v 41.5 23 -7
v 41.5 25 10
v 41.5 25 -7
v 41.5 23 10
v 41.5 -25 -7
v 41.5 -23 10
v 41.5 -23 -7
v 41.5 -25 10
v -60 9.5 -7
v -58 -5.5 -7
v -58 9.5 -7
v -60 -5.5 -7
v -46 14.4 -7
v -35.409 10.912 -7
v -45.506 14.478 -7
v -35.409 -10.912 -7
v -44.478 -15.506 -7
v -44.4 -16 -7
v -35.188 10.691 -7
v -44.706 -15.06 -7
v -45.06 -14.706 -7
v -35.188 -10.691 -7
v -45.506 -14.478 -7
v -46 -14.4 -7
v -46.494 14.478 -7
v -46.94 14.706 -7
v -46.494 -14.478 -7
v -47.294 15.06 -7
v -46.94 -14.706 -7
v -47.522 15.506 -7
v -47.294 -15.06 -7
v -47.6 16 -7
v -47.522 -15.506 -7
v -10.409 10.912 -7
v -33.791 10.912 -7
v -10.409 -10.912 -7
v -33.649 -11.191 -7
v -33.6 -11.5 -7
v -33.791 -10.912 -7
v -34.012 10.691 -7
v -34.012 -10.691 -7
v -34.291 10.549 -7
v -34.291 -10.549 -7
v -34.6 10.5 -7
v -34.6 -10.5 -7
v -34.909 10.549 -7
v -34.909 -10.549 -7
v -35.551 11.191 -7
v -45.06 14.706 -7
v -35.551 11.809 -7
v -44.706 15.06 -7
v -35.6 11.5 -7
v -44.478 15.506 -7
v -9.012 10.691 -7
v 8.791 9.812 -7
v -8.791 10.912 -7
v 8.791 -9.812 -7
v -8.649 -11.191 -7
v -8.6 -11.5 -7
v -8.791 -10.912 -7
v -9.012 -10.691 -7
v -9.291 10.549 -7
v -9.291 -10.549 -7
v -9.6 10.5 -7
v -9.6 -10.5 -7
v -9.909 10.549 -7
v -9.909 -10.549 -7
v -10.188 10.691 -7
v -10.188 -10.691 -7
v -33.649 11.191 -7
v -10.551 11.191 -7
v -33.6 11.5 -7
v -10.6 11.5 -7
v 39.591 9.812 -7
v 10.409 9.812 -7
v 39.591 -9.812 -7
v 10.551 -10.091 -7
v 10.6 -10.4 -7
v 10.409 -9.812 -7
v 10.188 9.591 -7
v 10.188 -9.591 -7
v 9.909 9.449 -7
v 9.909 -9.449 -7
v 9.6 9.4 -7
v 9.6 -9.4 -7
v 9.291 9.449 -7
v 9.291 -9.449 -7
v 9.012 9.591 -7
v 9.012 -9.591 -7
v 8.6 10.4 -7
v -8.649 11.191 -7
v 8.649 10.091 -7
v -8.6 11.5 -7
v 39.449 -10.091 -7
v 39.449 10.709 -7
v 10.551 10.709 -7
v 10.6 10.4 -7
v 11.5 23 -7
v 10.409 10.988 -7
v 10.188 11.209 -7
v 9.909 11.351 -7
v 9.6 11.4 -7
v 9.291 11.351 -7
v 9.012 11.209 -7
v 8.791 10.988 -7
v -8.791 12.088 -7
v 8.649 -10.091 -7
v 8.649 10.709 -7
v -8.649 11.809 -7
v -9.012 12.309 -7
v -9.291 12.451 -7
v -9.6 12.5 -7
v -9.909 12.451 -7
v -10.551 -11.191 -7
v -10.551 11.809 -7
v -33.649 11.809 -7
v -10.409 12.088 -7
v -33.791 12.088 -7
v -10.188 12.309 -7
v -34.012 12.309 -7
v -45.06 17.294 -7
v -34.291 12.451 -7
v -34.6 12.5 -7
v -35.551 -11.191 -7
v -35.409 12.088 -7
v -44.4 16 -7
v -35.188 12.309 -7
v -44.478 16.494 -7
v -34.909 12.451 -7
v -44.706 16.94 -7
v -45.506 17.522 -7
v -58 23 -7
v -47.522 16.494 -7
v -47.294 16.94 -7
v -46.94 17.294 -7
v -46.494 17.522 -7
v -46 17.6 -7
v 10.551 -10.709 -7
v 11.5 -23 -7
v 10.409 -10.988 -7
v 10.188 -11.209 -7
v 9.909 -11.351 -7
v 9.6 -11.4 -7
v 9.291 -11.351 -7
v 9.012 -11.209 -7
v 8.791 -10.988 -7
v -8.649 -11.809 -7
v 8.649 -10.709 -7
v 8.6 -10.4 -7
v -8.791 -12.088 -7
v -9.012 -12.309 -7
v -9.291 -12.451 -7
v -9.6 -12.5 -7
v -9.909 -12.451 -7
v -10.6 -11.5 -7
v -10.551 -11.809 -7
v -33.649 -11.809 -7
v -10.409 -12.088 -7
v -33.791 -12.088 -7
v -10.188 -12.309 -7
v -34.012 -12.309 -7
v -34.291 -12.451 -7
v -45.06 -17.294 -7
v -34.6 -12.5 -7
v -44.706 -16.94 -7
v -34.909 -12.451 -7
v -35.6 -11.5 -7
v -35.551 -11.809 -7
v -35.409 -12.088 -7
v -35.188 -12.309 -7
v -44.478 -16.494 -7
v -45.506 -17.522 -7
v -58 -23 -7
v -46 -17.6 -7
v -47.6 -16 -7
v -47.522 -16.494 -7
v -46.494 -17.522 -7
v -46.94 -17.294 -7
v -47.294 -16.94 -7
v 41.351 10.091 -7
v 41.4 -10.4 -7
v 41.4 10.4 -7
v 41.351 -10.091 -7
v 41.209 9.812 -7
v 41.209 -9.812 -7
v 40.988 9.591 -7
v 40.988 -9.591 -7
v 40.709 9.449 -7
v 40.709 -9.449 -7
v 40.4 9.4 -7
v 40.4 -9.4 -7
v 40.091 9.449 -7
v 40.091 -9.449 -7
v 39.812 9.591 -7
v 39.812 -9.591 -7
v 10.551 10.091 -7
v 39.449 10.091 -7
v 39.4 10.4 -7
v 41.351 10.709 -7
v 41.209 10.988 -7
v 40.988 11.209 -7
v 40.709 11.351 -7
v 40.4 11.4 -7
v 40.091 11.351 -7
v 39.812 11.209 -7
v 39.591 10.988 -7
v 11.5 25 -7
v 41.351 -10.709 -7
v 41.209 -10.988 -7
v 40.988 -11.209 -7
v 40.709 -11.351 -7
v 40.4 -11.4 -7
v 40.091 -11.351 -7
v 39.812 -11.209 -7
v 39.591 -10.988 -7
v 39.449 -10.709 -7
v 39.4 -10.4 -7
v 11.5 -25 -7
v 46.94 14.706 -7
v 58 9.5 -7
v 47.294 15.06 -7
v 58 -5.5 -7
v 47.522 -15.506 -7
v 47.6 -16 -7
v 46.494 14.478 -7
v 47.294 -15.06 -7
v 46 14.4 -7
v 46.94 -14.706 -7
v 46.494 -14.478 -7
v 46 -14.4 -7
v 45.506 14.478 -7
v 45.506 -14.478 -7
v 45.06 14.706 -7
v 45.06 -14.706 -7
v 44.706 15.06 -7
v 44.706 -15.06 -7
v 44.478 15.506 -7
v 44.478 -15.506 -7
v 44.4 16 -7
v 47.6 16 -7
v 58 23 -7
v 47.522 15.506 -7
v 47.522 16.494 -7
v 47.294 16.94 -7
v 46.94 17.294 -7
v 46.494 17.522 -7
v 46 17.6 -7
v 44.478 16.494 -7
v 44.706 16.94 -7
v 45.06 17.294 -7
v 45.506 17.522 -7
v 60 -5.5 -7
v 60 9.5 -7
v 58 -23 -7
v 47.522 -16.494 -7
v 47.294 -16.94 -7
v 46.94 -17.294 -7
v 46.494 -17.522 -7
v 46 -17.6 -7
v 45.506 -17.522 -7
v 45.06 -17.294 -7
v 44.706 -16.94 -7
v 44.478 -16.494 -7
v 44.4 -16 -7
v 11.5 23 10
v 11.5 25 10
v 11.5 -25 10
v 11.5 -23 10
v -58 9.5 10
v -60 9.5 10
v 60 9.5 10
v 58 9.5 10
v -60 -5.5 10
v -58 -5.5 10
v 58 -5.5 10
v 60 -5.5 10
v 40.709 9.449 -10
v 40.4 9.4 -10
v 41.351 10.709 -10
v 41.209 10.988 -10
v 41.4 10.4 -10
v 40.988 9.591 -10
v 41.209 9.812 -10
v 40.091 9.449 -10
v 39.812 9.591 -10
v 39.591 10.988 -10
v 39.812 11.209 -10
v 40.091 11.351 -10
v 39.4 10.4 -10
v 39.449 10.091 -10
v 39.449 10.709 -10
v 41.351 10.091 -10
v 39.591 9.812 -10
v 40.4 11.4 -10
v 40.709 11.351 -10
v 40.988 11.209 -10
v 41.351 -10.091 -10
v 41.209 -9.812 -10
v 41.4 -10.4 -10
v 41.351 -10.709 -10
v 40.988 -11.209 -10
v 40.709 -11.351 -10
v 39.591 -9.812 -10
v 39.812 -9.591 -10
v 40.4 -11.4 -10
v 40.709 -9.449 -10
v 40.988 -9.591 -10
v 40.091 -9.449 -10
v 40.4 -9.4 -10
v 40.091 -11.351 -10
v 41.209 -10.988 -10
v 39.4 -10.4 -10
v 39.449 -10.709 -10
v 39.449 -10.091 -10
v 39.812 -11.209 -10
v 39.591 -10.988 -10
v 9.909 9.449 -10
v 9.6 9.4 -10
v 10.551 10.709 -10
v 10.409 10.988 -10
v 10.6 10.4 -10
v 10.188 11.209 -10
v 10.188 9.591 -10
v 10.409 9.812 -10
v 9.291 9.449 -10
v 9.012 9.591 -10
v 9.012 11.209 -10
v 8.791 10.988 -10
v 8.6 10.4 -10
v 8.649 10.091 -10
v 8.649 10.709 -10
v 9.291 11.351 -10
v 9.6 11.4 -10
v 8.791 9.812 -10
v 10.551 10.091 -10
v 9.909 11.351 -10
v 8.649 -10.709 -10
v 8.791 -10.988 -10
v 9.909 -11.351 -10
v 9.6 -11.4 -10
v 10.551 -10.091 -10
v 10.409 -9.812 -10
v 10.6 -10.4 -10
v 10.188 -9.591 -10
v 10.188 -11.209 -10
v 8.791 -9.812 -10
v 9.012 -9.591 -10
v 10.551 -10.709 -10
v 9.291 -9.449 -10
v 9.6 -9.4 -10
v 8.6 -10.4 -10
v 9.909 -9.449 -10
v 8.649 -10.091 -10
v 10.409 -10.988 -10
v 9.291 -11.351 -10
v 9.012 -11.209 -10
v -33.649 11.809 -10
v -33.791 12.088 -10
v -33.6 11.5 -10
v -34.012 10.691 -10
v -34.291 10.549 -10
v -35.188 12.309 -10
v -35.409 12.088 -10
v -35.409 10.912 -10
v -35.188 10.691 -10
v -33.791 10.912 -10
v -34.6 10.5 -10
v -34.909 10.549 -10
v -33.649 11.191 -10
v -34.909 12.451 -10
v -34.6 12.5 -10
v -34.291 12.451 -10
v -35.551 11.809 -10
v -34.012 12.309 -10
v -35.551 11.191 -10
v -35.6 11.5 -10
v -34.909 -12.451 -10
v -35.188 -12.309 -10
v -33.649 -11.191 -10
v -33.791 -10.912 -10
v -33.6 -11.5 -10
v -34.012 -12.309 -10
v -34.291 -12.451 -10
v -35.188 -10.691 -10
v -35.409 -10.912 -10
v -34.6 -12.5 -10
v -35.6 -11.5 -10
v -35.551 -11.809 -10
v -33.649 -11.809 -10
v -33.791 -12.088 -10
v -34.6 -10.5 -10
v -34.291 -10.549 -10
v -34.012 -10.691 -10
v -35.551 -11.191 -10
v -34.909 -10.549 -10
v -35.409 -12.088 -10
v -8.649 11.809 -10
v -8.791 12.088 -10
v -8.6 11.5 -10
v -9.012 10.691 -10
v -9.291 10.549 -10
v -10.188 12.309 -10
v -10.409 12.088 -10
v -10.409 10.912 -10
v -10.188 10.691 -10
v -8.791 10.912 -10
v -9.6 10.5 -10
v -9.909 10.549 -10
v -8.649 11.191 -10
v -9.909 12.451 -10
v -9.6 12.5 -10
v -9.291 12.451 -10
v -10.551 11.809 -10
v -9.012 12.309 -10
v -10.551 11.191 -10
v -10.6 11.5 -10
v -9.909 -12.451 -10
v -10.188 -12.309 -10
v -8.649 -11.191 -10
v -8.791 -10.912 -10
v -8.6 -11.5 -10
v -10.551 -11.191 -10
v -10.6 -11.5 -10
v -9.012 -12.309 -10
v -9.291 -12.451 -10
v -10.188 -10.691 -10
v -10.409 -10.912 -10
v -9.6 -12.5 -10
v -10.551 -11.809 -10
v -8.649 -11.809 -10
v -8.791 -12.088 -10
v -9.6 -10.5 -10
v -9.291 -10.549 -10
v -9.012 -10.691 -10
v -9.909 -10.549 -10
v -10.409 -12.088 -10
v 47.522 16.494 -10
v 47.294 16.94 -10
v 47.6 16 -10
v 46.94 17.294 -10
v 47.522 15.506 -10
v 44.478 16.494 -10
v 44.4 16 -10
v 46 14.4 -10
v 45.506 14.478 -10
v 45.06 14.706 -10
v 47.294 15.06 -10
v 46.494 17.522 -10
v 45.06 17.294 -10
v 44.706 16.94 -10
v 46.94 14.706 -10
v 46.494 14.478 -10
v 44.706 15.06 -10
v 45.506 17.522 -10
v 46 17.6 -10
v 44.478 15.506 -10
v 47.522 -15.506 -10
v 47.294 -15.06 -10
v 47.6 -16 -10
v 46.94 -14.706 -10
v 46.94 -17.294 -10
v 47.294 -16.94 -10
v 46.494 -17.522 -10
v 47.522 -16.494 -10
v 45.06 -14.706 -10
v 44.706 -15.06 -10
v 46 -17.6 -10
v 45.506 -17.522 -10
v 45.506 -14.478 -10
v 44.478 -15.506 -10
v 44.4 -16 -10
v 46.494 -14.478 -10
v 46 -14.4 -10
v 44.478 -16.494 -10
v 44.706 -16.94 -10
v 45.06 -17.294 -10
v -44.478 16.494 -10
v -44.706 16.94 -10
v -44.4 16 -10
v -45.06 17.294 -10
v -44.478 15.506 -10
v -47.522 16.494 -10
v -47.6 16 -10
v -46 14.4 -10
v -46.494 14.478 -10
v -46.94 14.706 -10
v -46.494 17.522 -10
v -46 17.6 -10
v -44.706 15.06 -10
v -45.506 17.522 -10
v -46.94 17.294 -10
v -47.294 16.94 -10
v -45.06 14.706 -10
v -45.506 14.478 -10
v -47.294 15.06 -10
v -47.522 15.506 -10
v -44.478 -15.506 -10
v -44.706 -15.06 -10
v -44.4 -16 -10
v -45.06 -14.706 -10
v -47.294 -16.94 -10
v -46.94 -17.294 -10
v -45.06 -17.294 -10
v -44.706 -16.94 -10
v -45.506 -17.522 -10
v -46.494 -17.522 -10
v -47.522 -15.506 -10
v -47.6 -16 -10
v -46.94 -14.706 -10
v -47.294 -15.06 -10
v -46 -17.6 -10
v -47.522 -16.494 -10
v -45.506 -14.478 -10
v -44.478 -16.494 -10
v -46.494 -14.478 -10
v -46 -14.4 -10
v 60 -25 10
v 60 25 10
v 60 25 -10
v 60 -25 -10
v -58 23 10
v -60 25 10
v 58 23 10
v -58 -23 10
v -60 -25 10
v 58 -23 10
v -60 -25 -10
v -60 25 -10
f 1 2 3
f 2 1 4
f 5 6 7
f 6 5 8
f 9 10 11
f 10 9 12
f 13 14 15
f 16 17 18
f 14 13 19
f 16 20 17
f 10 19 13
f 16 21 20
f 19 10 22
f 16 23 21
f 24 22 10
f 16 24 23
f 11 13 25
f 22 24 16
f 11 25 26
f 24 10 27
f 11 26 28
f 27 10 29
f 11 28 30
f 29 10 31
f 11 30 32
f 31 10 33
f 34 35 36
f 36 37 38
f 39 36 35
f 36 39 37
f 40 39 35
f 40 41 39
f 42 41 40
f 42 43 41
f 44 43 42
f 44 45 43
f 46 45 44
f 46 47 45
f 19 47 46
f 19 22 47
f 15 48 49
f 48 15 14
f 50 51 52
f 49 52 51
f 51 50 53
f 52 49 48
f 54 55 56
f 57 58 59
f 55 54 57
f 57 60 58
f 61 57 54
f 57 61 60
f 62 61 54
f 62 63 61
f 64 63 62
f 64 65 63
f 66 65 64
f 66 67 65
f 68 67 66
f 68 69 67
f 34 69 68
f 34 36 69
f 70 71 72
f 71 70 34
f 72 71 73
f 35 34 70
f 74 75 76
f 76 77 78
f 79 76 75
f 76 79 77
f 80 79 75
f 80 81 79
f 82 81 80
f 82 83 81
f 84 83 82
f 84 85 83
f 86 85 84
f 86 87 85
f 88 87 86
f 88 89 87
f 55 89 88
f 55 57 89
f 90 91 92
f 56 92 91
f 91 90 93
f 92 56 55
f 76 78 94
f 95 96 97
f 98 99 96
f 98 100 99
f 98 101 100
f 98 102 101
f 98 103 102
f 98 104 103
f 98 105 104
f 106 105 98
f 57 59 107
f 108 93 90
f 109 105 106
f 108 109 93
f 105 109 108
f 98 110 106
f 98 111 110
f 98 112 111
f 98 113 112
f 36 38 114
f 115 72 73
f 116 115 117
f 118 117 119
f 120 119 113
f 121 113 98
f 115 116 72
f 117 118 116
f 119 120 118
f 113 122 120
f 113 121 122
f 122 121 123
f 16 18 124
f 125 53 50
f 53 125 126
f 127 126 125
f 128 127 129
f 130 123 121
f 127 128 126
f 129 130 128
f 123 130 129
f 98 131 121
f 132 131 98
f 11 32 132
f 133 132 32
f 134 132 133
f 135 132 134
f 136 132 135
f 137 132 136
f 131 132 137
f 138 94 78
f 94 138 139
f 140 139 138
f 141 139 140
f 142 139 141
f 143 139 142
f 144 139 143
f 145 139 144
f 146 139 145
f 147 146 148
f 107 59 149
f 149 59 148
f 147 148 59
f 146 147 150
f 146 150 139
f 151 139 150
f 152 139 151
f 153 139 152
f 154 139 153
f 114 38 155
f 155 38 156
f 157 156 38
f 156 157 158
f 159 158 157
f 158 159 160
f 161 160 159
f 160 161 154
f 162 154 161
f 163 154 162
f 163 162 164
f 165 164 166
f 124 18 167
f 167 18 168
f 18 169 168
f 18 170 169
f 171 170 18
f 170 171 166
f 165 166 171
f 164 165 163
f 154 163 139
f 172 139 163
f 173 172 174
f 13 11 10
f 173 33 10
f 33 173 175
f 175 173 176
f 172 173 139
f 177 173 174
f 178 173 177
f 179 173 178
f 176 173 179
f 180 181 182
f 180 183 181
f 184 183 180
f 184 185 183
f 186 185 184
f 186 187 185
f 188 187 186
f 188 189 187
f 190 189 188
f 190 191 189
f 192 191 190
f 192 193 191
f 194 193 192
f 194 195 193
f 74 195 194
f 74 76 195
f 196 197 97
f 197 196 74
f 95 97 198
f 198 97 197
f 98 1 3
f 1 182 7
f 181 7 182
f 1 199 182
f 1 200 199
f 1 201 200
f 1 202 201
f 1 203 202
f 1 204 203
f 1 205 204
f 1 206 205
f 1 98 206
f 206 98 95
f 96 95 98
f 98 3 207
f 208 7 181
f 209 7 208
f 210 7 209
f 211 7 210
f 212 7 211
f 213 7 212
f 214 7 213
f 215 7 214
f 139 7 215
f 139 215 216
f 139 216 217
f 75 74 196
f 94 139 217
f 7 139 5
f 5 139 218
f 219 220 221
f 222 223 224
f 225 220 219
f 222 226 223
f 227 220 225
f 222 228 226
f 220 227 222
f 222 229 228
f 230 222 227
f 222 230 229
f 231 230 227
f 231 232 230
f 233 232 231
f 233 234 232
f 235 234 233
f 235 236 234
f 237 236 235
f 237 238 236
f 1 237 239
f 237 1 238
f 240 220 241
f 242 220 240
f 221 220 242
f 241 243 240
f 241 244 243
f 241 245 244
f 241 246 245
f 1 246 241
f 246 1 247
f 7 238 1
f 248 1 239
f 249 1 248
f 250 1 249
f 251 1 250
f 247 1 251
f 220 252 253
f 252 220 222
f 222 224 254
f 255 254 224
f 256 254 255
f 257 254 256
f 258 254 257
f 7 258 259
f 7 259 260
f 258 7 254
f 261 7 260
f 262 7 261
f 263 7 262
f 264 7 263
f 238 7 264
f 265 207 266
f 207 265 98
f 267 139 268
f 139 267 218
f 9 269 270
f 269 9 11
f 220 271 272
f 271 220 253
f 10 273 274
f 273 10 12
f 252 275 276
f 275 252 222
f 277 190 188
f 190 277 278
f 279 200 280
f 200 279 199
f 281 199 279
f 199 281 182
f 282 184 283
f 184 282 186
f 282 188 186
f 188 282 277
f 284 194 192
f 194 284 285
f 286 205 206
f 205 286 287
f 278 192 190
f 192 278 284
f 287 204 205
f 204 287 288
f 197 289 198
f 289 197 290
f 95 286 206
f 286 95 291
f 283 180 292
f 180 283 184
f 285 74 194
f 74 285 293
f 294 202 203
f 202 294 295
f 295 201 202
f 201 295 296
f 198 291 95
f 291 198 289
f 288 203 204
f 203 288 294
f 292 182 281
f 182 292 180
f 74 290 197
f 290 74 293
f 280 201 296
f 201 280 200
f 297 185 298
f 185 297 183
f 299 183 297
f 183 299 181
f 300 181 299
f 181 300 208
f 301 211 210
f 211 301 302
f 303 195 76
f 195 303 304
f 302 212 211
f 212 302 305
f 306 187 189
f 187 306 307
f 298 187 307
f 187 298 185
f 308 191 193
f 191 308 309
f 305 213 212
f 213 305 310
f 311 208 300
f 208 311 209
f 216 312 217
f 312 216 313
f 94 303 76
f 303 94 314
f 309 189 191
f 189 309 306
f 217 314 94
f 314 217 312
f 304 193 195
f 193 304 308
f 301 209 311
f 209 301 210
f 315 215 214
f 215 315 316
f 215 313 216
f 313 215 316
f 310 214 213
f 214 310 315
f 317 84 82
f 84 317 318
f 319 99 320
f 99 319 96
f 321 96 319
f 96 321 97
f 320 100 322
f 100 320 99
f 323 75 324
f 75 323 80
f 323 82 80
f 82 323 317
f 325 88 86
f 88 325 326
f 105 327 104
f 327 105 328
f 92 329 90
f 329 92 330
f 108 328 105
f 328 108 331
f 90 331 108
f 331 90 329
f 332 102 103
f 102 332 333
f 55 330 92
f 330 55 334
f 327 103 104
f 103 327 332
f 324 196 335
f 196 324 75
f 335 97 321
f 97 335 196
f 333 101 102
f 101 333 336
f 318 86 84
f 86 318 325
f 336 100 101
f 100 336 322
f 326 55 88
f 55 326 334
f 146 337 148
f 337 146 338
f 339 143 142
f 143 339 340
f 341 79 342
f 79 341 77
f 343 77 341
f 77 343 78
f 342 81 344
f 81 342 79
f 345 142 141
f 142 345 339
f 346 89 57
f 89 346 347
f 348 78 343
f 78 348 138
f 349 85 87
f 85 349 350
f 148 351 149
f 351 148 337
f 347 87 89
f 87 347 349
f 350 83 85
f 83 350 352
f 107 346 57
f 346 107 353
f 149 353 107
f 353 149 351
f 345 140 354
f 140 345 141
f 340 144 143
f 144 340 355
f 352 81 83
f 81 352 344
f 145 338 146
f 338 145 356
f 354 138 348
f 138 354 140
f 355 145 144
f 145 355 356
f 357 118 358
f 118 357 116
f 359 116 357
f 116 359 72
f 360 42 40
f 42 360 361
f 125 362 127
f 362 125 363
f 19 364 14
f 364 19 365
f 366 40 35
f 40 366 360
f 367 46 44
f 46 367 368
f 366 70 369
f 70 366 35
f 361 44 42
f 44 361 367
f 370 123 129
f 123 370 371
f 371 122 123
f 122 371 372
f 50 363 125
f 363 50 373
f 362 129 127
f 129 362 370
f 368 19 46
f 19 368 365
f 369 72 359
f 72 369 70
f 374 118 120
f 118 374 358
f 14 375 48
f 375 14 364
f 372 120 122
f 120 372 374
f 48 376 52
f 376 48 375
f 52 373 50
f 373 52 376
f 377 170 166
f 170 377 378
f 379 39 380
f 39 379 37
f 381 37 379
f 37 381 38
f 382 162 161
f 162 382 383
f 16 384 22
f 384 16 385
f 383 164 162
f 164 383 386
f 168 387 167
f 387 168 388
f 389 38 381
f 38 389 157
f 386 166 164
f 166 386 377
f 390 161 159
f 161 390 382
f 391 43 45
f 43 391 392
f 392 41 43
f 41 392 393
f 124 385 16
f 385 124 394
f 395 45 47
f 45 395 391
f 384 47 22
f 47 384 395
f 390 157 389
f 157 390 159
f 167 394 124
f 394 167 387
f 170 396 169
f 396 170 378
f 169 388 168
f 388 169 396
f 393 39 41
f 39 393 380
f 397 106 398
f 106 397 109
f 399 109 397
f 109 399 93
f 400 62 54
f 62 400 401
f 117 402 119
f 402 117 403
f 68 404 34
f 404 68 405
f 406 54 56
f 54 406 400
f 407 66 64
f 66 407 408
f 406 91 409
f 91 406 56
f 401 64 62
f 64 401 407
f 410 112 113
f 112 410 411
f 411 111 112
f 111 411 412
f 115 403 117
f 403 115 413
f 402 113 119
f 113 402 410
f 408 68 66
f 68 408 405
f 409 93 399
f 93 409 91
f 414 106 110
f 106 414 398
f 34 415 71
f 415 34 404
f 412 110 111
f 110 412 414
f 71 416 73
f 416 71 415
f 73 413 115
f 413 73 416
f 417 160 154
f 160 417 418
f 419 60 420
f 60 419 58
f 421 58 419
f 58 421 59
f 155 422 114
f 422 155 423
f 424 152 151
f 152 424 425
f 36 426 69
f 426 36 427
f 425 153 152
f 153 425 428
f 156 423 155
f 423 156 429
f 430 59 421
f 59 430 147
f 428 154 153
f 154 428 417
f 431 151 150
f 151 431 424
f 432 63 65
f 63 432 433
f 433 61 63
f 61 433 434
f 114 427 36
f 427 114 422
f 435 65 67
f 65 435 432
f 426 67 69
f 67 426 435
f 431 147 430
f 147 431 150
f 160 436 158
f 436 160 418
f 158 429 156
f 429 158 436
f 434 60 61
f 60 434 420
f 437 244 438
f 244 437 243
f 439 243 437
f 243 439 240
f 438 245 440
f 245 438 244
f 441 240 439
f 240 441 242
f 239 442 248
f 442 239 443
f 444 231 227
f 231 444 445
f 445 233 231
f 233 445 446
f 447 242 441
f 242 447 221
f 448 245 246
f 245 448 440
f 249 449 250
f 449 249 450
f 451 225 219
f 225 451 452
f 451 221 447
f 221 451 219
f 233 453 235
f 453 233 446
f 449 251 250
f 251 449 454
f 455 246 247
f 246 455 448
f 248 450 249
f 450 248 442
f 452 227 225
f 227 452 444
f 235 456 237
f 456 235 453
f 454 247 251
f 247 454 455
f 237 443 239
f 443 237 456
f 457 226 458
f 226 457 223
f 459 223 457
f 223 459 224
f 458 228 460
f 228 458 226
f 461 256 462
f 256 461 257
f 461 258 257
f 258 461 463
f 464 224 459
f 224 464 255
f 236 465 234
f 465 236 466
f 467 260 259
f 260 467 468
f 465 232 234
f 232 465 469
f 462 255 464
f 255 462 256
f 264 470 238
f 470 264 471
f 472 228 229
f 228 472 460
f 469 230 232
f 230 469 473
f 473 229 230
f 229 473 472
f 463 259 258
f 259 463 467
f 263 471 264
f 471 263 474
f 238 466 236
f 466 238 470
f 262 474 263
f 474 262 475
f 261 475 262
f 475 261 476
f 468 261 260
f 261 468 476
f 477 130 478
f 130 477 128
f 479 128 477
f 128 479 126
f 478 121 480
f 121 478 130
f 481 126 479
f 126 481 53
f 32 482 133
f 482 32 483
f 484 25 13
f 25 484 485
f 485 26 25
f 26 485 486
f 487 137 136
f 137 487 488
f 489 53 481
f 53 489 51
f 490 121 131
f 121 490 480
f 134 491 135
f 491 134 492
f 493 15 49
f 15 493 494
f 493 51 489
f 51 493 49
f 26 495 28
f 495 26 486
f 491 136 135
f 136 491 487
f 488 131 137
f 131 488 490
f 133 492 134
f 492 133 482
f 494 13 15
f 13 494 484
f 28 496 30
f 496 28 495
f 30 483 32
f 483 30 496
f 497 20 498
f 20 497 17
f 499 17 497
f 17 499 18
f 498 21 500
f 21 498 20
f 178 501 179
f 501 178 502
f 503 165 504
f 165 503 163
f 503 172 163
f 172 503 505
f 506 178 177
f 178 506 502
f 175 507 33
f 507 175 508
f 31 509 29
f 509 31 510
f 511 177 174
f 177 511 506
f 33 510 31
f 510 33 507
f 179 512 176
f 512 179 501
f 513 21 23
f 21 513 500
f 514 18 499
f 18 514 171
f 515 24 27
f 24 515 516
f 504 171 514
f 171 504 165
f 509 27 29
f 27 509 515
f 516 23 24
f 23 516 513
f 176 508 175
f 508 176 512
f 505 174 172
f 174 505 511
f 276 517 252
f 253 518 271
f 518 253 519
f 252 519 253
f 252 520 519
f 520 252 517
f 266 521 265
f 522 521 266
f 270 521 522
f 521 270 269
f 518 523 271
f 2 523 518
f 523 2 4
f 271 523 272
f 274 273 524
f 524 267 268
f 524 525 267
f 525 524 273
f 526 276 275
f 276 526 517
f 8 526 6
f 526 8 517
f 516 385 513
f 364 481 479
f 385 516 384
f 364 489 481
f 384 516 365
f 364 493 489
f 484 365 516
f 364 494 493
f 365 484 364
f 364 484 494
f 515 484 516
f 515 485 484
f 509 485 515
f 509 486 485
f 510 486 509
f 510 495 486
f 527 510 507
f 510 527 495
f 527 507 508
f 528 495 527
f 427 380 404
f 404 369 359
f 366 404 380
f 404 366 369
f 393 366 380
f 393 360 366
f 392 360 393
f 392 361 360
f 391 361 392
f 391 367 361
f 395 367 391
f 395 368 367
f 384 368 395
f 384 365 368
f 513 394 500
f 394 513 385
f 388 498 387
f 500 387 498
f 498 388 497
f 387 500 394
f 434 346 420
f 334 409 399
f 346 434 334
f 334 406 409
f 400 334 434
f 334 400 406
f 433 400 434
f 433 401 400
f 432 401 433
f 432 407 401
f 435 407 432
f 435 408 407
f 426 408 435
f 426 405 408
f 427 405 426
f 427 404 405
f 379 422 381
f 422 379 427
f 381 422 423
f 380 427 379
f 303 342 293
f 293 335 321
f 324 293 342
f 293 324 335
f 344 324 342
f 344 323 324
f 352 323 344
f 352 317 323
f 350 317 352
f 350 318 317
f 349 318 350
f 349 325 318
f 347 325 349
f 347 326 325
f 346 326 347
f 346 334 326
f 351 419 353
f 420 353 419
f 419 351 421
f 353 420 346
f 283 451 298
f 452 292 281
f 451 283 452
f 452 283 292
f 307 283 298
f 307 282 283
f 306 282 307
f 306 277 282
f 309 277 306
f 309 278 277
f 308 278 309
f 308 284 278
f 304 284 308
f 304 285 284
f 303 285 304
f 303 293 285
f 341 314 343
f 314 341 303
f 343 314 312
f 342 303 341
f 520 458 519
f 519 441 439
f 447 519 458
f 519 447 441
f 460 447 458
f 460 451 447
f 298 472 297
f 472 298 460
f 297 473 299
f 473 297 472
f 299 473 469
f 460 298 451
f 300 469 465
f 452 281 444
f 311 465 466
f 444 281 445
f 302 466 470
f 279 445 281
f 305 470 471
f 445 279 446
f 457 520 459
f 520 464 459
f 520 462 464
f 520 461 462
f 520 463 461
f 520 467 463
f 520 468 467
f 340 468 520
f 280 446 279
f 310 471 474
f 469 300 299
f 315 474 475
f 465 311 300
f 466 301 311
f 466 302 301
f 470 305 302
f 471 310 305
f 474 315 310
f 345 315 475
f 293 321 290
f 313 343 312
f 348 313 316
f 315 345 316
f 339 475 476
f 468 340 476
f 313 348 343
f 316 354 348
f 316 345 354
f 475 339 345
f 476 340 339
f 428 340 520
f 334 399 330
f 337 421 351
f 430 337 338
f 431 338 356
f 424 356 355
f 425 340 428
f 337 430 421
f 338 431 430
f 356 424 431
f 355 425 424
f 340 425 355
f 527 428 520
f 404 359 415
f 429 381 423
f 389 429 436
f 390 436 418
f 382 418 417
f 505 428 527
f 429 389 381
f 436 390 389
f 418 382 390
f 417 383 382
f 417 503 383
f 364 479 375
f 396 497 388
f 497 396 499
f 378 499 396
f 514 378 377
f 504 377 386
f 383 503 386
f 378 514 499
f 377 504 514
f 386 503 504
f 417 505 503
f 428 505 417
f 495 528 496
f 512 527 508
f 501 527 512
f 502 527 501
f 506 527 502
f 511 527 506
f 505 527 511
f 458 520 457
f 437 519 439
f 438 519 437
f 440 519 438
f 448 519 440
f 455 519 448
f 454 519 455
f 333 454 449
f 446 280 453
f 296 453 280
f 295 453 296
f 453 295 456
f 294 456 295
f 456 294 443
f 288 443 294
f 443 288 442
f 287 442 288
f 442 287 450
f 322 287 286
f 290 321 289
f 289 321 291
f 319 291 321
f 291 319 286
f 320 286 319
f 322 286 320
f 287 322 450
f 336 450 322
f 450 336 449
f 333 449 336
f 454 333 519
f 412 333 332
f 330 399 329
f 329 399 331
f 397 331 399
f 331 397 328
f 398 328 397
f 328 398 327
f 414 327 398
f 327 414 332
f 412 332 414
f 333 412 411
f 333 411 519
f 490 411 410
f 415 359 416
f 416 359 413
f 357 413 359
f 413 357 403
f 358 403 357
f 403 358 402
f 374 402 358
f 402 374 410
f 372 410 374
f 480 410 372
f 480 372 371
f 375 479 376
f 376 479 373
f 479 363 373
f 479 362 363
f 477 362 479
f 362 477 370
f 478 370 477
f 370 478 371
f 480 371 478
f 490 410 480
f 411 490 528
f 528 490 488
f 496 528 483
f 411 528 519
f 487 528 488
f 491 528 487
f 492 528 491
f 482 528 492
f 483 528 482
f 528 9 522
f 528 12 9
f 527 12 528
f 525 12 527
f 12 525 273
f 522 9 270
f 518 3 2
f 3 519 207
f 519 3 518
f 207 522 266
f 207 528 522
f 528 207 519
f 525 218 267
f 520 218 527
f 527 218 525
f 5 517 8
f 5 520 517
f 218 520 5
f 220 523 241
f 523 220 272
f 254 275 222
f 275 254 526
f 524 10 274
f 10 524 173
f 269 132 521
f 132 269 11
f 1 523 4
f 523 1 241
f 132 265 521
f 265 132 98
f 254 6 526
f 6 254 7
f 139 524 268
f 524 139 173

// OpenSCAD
// Case enclosure for:
//   Sparkfun SX1509 I/O Expander board
//   Two Adafruit ADS1015 Analog Input boards
//

// Number of facets for cylinders
$fn = 20;

enclosure_x_dim = 120;
enclosure_y_dim = 50;
enclosure_height = 20;

sx1509_standoff_x_offset = 15.4;
sx1509_standoff_y_offset = 10.4;
standoff_hole_radius = 1;

ads1015_standoff_y_offset = 11.5;

mount_x_offset = 21;
mount_y_offset = 16;
mount_hole_radius = 1.6;

base_thickness = 3;
wall_width = 2;
wall_height = enclosure_height;

BELOW_PLANE = -1;
INF = 100000;

io_shift = 25;
io_width = 25;

difference() {
    // outer extents
    cube([enclosure_x_dim ,enclosure_y_dim ,enclosure_height], center = true);

    // cutout inside to form walls
    translate([0,   0, base_thickness])cube([enclosure_x_dim -(2*wall_width),enclosure_y_dim -(2*wall_width), wall_height], center = true);

    translate([io_shift,0,0]){

        // I/O side cuts
        translate([1.5, 0, base_thickness])cube([30,INF,wall_height], center = true);
        translate([0,   2, base_thickness])cube([INF,15,wall_height], center = true);
         
        // SX1509 mounting holes
        translate([sx1509_standoff_x_offset,sx1509_standoff_y_offset, BELOW_PLANE])   cylinder(r=standoff_hole_radius, h=INF, center=true);
        translate([sx1509_standoff_x_offset,-sx1509_standoff_y_offset, BELOW_PLANE])  cylinder(r=standoff_hole_radius, h=INF, center=true);
        translate([-sx1509_standoff_x_offset,sx1509_standoff_y_offset, BELOW_PLANE])  cylinder(r=standoff_hole_radius, h=INF, center=true);
        translate([-sx1509_standoff_x_offset,-sx1509_standoff_y_offset, BELOW_PLANE]) cylinder(r=standoff_hole_radius, h=INF, center=true);

        // ADS1015 #1 mounting holes
        translate([sx1509_standoff_x_offset-(io_shift+2*io_width),ads1015_standoff_y_offset, BELOW_PLANE])  cylinder(r=standoff_hole_radius, h=INF, center=true);
        translate([sx1509_standoff_x_offset-(io_shift+2*io_width),-ads1015_standoff_y_offset, BELOW_PLANE]) cylinder(r=standoff_hole_radius, h=INF, center=true);

        // ADS1015 #2 mounting holes
        translate([sx1509_standoff_x_offset-(io_shift+io_width),ads1015_standoff_y_offset, BELOW_PLANE])  cylinder(r=standoff_hole_radius, h=INF, center=true);
        translate([sx1509_standoff_x_offset-(io_shift+io_width),-ads1015_standoff_y_offset, BELOW_PLANE]) cylinder(r=standoff_hole_radius, h=INF, center=true);
            
        // Enclosure mounting holes
        translate([mount_x_offset,mount_y_offset, BELOW_PLANE])   cylinder(r=mount_hole_radius, h=INF, center=true);
        translate([mount_x_offset,-mount_y_offset, BELOW_PLANE])  cylinder(r=mount_hole_radius, h=INF, center=true);
        translate([-mount_x_offset-(2*io_width),mount_y_offset, BELOW_PLANE])  cylinder(r=mount_hole_radius, h=INF, center=true);
        translate([-mount_x_offset-(2*io_width),-mount_y_offset, BELOW_PLANE]) cylinder(r=mount_hole_radius, h=INF, center=true);
    }
}
